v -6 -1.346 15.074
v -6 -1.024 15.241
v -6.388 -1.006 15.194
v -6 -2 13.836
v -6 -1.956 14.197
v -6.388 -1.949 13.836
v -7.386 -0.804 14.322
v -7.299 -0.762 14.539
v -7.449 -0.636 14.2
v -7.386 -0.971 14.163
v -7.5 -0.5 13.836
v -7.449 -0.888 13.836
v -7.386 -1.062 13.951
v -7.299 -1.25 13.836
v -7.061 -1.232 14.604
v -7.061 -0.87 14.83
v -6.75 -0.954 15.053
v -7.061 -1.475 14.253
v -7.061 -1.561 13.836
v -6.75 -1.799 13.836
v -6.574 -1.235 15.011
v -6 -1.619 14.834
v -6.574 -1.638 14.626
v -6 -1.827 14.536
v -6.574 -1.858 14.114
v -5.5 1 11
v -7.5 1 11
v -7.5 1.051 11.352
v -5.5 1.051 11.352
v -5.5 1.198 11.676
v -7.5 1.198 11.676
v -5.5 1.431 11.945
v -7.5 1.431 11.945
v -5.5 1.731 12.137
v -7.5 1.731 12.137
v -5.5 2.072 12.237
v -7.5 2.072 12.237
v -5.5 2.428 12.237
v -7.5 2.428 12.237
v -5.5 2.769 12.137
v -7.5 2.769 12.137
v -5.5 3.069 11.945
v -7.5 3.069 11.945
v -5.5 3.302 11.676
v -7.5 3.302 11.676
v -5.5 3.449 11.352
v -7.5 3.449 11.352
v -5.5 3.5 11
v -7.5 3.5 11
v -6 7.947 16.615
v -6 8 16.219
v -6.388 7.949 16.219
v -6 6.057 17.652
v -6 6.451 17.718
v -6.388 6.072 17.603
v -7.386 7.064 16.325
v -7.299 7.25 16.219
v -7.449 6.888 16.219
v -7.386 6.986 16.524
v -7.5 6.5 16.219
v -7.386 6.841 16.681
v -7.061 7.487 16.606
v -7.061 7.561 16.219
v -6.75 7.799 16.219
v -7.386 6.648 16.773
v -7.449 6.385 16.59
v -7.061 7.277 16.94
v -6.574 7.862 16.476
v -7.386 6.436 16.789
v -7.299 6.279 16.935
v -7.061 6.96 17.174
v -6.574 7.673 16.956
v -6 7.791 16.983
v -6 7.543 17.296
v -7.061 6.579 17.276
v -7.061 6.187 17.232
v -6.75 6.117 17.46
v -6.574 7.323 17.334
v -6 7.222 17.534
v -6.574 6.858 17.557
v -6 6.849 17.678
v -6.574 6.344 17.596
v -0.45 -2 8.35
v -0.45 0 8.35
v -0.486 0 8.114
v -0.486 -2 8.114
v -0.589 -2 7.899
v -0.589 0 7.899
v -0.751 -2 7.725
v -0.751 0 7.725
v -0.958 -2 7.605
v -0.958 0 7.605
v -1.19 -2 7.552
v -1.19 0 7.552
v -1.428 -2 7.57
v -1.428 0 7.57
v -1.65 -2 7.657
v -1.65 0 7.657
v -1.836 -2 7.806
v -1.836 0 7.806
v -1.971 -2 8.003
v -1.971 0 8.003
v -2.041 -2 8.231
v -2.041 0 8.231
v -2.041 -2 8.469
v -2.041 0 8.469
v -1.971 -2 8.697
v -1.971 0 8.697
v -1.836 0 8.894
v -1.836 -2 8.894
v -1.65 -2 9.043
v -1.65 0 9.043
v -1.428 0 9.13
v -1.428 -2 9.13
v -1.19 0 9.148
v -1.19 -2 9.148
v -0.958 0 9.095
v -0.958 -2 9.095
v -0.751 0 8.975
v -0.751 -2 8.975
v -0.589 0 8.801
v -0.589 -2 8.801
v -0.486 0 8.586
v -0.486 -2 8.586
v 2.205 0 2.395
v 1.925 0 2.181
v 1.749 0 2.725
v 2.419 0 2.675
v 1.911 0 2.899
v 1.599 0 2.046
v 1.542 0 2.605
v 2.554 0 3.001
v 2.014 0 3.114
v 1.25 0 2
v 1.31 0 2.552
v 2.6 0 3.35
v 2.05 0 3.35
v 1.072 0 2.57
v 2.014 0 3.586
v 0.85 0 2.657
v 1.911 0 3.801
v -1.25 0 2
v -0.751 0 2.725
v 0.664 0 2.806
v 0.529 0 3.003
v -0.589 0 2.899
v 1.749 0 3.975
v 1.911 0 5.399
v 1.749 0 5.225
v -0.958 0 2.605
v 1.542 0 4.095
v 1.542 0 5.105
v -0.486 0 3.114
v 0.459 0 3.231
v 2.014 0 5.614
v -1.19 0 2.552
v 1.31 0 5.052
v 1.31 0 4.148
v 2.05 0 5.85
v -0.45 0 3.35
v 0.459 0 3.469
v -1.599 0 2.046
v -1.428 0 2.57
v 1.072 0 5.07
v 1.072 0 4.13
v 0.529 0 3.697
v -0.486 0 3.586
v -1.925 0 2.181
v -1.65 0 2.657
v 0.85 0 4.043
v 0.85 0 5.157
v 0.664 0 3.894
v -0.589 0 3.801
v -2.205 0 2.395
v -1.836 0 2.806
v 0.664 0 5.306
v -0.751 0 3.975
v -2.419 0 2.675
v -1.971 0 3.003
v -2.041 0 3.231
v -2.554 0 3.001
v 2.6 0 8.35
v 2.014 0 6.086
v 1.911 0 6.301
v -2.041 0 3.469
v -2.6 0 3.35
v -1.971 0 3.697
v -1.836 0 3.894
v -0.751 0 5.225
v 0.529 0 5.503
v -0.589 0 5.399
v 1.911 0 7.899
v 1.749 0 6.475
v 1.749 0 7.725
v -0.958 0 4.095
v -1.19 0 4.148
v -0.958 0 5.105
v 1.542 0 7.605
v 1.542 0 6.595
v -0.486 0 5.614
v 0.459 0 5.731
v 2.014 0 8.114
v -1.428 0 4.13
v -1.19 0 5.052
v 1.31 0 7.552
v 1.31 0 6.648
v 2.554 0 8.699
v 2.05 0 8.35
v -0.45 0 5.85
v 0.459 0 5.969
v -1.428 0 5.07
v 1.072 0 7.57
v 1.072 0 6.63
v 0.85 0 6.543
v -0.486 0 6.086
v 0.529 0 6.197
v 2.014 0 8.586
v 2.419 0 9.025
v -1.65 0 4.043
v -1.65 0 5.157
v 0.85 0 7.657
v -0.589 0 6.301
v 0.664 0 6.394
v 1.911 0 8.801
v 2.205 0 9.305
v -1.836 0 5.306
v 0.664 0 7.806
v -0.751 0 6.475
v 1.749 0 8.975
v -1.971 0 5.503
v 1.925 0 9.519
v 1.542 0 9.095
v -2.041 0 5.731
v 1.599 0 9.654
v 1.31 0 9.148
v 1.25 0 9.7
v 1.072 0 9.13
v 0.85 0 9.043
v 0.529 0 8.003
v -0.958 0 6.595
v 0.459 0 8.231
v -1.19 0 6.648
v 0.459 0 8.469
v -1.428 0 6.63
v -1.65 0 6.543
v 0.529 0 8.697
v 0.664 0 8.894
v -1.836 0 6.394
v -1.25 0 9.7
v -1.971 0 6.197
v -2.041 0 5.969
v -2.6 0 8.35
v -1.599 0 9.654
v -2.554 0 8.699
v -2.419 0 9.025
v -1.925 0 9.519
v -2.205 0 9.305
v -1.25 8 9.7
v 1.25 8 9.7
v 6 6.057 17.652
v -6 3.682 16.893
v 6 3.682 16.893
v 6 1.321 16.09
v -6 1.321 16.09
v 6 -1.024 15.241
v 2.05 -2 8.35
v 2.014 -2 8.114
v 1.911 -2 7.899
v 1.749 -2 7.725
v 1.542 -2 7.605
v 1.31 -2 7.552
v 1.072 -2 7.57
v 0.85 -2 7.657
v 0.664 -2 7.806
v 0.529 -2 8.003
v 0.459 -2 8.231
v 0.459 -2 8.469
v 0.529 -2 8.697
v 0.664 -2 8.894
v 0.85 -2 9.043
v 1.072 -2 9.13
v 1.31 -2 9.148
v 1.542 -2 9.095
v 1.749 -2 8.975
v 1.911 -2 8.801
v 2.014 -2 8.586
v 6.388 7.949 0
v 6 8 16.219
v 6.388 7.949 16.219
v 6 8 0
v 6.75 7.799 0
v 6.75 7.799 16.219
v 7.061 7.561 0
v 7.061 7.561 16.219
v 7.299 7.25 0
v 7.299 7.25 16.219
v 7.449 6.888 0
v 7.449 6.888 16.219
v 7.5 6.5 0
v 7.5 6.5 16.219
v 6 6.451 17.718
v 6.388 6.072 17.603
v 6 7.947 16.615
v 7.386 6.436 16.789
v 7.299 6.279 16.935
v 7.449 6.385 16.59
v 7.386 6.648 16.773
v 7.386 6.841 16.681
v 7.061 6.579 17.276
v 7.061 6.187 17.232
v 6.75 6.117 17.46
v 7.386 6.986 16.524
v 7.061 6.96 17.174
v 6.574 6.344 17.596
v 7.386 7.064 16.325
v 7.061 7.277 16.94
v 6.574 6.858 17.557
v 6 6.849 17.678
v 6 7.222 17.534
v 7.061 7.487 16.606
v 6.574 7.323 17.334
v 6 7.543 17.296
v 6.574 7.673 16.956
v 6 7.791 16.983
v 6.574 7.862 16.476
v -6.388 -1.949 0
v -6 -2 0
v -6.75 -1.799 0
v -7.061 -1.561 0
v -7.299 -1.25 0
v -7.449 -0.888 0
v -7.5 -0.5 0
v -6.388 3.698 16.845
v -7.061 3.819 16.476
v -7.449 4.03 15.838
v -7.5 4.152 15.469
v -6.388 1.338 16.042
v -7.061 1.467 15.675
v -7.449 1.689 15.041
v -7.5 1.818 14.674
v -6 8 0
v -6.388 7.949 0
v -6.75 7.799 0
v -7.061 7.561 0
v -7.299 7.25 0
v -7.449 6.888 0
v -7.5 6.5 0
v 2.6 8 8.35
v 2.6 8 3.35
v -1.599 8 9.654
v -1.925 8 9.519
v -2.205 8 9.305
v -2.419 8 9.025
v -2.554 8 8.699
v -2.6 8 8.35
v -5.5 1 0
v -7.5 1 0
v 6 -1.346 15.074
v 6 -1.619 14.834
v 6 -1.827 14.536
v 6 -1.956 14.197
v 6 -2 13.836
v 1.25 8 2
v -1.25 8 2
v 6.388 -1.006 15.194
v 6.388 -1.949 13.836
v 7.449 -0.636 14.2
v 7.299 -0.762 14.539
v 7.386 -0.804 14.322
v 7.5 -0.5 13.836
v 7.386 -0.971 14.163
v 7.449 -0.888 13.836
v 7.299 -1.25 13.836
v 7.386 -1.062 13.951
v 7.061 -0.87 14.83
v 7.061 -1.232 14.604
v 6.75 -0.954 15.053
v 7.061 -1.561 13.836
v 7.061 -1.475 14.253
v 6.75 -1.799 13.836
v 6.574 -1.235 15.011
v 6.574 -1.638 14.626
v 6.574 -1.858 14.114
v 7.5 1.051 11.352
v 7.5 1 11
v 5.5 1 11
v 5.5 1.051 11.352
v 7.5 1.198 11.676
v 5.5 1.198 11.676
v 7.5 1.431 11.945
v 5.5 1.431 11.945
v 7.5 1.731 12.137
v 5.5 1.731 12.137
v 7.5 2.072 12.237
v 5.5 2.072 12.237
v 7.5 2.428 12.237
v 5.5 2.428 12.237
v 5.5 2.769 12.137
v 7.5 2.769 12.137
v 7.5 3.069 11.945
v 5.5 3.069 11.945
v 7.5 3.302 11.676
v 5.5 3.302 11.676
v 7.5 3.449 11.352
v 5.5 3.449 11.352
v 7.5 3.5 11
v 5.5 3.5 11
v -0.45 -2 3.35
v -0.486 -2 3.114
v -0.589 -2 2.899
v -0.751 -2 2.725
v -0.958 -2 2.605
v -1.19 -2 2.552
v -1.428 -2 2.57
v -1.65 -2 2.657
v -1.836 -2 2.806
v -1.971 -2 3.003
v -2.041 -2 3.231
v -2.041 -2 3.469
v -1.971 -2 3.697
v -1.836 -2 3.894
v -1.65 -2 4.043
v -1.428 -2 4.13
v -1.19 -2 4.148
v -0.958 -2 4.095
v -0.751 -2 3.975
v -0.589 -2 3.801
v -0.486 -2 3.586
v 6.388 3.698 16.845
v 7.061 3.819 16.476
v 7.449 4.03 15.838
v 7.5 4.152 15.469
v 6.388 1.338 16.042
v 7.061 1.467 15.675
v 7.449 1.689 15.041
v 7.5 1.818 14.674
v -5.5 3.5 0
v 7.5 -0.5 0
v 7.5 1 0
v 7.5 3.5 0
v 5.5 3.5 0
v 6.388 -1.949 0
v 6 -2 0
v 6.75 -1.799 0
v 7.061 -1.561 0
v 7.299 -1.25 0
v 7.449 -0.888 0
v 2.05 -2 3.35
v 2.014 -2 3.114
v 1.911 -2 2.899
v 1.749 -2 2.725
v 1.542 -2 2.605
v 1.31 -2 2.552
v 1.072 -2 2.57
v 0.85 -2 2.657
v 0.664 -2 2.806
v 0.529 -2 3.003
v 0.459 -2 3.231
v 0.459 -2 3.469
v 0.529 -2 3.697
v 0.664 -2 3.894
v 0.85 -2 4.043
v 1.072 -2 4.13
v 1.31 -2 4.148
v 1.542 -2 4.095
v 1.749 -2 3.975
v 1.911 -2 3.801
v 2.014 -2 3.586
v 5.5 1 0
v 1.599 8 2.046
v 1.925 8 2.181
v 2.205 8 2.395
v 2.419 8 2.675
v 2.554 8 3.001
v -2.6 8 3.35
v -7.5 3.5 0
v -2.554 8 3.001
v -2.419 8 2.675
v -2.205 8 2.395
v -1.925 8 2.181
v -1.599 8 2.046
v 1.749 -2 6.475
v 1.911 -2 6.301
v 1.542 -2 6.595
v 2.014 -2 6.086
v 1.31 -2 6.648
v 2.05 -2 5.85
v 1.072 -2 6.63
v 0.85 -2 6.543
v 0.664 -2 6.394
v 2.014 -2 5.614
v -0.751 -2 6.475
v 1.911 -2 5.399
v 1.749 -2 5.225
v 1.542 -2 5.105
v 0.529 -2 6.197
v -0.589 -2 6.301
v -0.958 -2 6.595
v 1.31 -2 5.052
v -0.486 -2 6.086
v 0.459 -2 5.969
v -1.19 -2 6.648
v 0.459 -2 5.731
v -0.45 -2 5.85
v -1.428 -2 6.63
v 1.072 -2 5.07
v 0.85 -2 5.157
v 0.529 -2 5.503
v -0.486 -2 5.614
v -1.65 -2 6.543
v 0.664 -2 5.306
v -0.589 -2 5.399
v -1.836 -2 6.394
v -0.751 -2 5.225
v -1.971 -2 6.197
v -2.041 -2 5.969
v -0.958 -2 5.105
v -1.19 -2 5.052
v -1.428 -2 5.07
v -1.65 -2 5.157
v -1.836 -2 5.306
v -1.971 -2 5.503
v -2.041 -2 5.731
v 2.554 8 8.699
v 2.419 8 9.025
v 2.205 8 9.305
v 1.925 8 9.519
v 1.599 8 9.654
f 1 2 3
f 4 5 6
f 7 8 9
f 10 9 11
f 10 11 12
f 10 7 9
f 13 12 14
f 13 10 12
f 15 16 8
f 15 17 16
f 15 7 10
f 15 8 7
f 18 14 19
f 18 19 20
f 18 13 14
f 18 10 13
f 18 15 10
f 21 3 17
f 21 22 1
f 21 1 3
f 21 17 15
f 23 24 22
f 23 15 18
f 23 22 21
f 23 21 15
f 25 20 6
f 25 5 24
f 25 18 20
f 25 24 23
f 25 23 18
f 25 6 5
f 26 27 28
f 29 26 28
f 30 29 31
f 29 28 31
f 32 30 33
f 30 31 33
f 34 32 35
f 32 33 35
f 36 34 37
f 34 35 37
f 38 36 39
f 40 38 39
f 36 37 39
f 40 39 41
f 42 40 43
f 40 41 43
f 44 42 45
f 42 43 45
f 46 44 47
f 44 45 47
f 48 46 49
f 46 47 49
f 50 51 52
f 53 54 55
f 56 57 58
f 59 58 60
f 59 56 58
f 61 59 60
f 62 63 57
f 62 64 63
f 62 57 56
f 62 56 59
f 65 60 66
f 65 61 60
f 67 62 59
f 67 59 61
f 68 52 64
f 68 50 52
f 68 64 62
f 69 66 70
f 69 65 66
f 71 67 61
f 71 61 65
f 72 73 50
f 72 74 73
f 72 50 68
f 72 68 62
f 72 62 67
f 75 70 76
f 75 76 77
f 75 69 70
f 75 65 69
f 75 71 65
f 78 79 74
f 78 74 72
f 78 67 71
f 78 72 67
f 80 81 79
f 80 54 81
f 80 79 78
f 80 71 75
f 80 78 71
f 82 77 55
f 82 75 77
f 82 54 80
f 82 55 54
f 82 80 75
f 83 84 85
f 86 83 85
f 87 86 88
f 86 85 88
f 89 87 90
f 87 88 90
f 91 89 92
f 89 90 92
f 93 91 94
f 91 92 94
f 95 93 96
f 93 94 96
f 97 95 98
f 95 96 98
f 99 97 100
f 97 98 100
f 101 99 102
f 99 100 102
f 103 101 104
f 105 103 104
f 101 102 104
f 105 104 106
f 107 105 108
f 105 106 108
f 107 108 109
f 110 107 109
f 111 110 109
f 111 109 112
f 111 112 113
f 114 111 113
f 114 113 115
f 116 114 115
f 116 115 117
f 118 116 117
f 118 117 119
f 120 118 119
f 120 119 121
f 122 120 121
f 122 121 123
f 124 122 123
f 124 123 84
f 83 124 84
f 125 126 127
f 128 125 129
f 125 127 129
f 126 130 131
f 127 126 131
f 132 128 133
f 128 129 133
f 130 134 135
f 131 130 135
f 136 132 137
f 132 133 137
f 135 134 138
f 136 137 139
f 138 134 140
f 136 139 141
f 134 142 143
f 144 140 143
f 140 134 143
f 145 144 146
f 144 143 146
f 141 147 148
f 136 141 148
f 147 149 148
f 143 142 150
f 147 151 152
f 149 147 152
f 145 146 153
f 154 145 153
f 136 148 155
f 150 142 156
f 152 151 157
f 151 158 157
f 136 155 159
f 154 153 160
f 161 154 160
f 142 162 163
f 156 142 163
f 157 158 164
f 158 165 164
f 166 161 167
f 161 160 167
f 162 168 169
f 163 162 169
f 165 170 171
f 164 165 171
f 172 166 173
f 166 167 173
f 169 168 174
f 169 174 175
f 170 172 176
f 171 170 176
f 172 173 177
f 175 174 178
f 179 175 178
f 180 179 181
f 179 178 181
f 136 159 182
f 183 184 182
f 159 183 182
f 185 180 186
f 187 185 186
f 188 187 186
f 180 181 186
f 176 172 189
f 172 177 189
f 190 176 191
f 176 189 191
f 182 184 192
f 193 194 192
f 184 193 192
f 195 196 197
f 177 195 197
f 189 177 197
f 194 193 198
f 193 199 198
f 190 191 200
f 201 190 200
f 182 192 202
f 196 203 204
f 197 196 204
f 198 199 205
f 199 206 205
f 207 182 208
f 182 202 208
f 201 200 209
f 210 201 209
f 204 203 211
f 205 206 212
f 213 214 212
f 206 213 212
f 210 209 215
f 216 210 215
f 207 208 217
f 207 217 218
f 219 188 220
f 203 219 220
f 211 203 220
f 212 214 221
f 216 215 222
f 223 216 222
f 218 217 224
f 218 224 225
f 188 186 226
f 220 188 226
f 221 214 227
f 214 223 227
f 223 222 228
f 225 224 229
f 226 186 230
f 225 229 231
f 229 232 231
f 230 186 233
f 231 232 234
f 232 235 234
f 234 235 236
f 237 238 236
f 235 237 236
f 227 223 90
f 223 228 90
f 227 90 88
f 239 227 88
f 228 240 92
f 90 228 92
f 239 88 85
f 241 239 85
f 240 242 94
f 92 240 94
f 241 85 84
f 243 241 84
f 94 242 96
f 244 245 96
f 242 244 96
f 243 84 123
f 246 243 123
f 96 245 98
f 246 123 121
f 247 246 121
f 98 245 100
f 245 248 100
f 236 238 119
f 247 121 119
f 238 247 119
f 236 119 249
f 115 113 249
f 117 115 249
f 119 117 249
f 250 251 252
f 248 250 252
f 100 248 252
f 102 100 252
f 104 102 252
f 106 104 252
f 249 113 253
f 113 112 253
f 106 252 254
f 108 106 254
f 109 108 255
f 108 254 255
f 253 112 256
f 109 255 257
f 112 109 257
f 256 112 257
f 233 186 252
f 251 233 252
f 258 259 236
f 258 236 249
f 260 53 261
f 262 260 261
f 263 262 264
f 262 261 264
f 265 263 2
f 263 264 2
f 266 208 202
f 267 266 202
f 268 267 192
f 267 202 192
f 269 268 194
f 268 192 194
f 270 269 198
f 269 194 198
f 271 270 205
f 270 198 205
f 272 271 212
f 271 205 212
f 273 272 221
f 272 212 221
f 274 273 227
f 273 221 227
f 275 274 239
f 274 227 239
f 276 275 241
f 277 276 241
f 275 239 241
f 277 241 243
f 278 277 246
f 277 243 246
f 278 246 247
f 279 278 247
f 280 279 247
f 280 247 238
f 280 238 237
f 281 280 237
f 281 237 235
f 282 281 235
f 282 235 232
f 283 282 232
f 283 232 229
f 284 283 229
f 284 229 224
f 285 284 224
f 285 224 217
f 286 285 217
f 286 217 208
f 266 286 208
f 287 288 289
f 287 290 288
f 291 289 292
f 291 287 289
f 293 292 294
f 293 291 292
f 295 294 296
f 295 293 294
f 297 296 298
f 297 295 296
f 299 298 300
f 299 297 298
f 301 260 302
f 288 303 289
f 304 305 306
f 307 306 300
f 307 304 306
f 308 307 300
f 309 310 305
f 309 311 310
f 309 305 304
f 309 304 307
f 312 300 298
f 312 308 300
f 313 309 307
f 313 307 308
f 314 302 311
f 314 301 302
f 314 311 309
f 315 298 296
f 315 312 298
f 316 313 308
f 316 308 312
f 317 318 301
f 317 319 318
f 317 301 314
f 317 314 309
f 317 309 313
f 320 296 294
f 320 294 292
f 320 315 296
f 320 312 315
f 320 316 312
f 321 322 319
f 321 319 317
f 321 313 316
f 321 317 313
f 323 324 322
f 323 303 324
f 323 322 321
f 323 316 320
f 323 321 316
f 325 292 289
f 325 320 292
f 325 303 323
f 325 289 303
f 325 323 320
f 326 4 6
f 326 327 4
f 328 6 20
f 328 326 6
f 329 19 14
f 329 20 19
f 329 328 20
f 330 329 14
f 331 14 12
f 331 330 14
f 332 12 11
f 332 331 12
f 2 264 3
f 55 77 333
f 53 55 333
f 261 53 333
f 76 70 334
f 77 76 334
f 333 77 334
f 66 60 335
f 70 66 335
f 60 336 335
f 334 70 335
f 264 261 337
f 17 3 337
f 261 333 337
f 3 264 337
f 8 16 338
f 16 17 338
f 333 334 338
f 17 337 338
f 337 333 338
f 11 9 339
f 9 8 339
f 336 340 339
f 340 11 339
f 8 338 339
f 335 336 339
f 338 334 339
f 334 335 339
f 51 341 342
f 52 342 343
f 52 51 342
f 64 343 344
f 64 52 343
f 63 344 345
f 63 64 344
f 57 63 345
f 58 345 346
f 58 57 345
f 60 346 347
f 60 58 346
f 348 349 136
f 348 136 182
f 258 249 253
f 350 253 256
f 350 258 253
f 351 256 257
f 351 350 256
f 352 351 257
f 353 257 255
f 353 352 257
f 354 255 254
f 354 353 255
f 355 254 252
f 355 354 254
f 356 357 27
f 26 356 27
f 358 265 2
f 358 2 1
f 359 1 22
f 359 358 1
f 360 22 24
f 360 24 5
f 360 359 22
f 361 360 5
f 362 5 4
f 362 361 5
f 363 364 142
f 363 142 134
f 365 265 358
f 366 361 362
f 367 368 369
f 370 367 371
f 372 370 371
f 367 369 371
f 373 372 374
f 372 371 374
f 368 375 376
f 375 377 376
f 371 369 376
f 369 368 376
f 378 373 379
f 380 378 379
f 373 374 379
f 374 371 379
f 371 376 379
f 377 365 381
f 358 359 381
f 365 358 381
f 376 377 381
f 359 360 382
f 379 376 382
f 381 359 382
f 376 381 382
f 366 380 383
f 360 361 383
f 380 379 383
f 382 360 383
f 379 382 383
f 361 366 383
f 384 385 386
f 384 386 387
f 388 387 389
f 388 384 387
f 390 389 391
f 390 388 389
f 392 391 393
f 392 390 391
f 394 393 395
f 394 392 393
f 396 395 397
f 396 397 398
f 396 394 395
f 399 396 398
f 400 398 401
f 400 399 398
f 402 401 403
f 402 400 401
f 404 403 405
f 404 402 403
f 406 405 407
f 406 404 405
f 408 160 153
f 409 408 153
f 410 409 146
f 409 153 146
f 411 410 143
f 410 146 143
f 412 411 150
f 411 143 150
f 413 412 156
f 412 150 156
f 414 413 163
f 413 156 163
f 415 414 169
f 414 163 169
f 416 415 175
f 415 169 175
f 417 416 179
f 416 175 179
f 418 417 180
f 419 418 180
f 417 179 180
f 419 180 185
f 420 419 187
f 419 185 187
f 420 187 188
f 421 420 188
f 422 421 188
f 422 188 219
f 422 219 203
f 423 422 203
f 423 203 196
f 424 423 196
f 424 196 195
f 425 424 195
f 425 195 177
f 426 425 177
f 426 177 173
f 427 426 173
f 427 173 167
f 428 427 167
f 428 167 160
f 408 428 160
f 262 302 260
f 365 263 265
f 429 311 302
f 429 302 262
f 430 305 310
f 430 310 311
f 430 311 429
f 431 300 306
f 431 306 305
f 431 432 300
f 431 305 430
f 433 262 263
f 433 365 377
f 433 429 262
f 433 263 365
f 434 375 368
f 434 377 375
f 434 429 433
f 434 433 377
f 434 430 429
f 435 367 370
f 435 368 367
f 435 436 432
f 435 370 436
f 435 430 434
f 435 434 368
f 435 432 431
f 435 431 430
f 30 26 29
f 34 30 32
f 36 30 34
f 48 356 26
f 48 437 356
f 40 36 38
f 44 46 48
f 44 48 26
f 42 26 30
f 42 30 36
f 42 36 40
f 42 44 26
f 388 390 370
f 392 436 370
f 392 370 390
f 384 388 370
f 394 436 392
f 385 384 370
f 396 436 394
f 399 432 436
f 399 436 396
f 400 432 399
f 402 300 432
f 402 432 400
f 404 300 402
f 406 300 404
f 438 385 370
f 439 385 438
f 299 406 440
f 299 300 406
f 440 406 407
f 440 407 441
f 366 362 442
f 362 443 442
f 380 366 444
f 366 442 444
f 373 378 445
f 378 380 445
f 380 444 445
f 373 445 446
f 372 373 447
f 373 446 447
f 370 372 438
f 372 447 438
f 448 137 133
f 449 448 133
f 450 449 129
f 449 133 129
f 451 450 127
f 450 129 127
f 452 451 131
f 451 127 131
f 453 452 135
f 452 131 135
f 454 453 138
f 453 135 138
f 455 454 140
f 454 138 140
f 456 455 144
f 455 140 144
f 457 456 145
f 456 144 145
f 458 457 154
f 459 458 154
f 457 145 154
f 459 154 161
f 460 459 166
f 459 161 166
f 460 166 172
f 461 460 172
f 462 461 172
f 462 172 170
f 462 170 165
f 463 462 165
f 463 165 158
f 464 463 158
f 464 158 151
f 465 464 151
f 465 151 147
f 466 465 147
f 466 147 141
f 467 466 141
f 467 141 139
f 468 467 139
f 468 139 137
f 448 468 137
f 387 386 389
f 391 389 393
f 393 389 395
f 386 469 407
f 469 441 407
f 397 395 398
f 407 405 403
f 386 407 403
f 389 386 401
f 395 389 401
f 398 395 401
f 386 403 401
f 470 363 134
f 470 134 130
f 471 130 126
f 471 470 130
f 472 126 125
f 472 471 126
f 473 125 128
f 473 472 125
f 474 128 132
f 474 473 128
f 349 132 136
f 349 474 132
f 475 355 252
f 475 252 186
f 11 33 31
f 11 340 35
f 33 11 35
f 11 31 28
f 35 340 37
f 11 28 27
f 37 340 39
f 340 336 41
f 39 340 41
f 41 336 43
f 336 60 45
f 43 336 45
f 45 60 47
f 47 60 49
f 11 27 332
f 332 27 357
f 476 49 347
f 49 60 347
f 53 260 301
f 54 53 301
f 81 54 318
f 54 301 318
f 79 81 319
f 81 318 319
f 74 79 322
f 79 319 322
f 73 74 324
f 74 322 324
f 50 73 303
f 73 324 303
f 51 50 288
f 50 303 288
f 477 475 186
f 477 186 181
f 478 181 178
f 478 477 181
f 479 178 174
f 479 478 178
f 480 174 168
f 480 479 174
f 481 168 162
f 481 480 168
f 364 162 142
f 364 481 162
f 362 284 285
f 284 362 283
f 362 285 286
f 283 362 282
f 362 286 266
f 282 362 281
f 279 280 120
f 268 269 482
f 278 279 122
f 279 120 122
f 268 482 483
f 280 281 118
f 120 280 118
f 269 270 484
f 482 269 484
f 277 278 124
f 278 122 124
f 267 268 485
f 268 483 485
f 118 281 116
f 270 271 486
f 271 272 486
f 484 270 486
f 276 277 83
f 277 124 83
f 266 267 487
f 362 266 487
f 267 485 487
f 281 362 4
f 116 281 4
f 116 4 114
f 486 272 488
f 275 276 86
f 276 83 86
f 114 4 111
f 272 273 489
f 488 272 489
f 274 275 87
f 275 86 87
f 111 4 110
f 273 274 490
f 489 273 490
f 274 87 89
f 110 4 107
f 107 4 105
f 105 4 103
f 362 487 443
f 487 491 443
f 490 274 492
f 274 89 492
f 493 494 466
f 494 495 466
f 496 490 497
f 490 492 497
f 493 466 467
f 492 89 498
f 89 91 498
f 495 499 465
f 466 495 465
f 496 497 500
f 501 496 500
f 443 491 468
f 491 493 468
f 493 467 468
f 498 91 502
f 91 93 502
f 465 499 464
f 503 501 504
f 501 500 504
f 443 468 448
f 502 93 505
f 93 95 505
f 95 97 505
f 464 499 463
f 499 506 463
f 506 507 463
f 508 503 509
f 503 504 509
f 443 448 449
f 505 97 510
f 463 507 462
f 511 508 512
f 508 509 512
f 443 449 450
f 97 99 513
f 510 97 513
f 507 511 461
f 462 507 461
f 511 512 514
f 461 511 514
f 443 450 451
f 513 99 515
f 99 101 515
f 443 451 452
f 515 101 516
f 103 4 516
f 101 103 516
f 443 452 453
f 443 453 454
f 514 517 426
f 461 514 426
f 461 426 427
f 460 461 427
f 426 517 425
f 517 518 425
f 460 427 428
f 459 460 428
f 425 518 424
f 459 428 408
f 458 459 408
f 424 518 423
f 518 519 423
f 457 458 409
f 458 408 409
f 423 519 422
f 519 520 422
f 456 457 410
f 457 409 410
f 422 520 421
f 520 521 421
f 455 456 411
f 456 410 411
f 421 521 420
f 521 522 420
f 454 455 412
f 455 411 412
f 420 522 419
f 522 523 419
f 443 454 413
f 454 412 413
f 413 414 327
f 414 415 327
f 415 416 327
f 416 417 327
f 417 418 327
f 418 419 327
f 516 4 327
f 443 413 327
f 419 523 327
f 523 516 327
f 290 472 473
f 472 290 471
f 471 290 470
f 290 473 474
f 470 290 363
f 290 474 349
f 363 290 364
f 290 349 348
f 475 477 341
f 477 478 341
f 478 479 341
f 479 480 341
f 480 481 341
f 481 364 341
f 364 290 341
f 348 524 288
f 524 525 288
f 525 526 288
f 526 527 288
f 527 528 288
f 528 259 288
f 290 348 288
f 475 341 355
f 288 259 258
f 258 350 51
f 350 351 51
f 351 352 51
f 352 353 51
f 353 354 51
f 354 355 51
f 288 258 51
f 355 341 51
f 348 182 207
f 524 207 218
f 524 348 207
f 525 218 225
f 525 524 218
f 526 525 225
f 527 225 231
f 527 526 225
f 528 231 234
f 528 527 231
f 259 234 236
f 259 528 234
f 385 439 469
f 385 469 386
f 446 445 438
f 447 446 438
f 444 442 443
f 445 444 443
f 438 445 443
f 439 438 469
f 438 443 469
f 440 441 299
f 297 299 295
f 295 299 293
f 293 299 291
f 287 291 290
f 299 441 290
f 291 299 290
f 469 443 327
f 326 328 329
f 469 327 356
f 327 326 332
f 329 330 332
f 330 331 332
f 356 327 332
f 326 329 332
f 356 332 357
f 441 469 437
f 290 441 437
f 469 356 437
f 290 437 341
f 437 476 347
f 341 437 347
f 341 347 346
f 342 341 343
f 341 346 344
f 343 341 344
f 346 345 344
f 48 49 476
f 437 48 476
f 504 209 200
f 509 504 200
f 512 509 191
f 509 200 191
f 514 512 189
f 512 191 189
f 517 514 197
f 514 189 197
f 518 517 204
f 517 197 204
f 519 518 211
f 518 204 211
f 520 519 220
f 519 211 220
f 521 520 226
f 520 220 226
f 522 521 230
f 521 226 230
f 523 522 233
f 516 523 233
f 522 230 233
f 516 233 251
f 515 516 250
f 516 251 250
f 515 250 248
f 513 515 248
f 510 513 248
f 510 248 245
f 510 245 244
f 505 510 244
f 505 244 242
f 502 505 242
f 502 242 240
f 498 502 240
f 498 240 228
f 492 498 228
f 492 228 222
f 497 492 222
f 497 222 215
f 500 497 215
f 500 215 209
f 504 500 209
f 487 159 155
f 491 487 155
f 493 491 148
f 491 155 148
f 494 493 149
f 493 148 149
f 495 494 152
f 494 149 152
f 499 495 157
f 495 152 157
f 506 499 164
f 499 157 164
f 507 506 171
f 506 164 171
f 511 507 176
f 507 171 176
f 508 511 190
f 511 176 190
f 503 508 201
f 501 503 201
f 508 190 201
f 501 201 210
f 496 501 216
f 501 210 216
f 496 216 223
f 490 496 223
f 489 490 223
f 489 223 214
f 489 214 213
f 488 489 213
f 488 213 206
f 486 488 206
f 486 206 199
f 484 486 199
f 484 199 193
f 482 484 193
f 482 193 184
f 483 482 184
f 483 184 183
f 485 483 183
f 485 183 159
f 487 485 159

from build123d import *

# Parameters (mm, degrees)
SKETCH1_W               = 15
SKETCH1_H               = 8
BOSS_EXTRUDE1_DEPTH     = 10
CUT_EXTRUDE1_DEPTH      = 9
BOSS_EXTRUDE2_DEPTH     = 15
CUT_EXTRUDE2_DEPTH      = 2
SKETCH6_R               = 0.8
CUT_EXTRUDE3_DEPTH      = 9
CUT_EXTRUDE3_DEPTH_BACK = 3
FILLET1_R               = 1.5


with BuildPart() as part:
    # Sketch1 → Boss-Extrude1 (new body)
    with BuildSketch(Plane.XY):
        with Locations((0, 4)):
            Rectangle(SKETCH1_W, SKETCH1_H)
    extrude(amount=BOSS_EXTRUDE1_DEPTH)

    # Sketch2 → Cut-Extrude1 (cut, through all)
    with BuildSketch(Plane(origin=(0, 8, 0), x_dir=(1, 0, 0), z_dir=(0, 1, 0))):
        with BuildLine():
            Line((-1.25, -2), (1.25, -2))
            ThreePointArc((1.25, -2), (2.204594155, -2.395405845), (2.6, -3.35))
            Line((2.6, -3.35), (2.6, -8.35))
            ThreePointArc((2.6, -8.35), (2.204594155, -9.304594155), (1.25, -9.7))
            Line((1.25, -9.7), (-1.25, -9.7))
            ThreePointArc((-1.25, -9.7), (-2.204594155, -9.304594155), (-2.6, -8.35))
            Line((-2.6, -8.35), (-2.6, -3.35))
            ThreePointArc((-2.6, -3.35), (-2.204594155, -2.395405845), (-1.25, -2))
        make_face()
    extrude(amount=-CUT_EXTRUDE1_DEPTH, mode=Mode.SUBTRACT)

    # Sketch3 → Boss-Extrude2 (add)
    with BuildSketch(Plane(origin=(-7.5, 0, 0), x_dir=(0, 0, -1), z_dir=(1, 0, 0))):
        with BuildLine():
            ThreePointArc((-18.235493239, 8), (-16.655013859, 2.966168092), (-14.873286259, -2))
            Line((-14.873286259, -2), (0, -2))
            Line((0, -2), (0, 0))
            Line((0, 0), (-10, 0))
            Line((-10, 0), (-10, 8))
            Line((-10, 8), (-15.107085438, 8))
            Line((-15.107085438, 8), (-18.235493239, 8))
        make_face()
    extrude(amount=BOSS_EXTRUDE2_DEPTH)

    # Sketch5 → Cut-Extrude2 (cut)
    with BuildSketch(Plane(origin=(7.5, 0, 0), x_dir=(0, 0, -1), z_dir=(1, 0, 0))):
        with BuildLine():
            Line((0, 1), (-11, 1))
            ThreePointArc((-11, 1), (-12.25, 2.25), (-11, 3.5))
            Line((-11, 3.5), (0, 3.5))
            Line((0, 3.5), (0, 1))
        make_face()
    cut_extrude2 = extrude(amount=-CUT_EXTRUDE2_DEPTH, mode=Mode.SUBTRACT)

    # Mirror1: Cut-Extrude2 across plane
    add(cut_extrude2.mirror(Plane(origin=(0, 0, 0), x_dir=(0, 0, 1), z_dir=(1, 0, 0))), mode=Mode.SUBTRACT)

    # Sketch6 → Cut-Extrude3 (cut, two sides)
    with BuildSketch(Plane(origin=(0, 0, 0), x_dir=(1, 0, 0), z_dir=(0, 1, 0))) as cut_extrude3_sk:
        with Locations((-1.25, -3.35)):
            Circle(SKETCH6_R)
        with Locations((1.25, -3.35)):
            Circle(SKETCH6_R)
        with Locations((1.25, -5.85)):
            Circle(SKETCH6_R)
        with Locations((1.25, -8.35)):
            Circle(SKETCH6_R)
        with Locations((-1.25, -5.85)):
            Circle(SKETCH6_R)
        with Locations((-1.25, -8.35)):
            Circle(SKETCH6_R)
    extrude(amount=CUT_EXTRUDE3_DEPTH, mode=Mode.SUBTRACT)
    extrude(cut_extrude3_sk.sketch, amount=-CUT_EXTRUDE3_DEPTH_BACK, mode=Mode.SUBTRACT)

    # Fillet1
    fillet1_edges = [part.edges().sort_by_distance(p)[0] for p in [
        (-7.5, -2, 7.436643129),
        (0, -2, 14.873286259),
        (-7.5, 2.966168092, 16.655013859),
        (0, 8, 18.235493239),
        (7.5, 2.966168092, 16.655013859),
        (7.5, -2, 7.436643129),
        (-7.5, 8, 9.11774662),
        (7.5, 8, 9.11774662),
    ]]
    fillet(fillet1_edges, radius=FILLET1_R)


solid = part.part
